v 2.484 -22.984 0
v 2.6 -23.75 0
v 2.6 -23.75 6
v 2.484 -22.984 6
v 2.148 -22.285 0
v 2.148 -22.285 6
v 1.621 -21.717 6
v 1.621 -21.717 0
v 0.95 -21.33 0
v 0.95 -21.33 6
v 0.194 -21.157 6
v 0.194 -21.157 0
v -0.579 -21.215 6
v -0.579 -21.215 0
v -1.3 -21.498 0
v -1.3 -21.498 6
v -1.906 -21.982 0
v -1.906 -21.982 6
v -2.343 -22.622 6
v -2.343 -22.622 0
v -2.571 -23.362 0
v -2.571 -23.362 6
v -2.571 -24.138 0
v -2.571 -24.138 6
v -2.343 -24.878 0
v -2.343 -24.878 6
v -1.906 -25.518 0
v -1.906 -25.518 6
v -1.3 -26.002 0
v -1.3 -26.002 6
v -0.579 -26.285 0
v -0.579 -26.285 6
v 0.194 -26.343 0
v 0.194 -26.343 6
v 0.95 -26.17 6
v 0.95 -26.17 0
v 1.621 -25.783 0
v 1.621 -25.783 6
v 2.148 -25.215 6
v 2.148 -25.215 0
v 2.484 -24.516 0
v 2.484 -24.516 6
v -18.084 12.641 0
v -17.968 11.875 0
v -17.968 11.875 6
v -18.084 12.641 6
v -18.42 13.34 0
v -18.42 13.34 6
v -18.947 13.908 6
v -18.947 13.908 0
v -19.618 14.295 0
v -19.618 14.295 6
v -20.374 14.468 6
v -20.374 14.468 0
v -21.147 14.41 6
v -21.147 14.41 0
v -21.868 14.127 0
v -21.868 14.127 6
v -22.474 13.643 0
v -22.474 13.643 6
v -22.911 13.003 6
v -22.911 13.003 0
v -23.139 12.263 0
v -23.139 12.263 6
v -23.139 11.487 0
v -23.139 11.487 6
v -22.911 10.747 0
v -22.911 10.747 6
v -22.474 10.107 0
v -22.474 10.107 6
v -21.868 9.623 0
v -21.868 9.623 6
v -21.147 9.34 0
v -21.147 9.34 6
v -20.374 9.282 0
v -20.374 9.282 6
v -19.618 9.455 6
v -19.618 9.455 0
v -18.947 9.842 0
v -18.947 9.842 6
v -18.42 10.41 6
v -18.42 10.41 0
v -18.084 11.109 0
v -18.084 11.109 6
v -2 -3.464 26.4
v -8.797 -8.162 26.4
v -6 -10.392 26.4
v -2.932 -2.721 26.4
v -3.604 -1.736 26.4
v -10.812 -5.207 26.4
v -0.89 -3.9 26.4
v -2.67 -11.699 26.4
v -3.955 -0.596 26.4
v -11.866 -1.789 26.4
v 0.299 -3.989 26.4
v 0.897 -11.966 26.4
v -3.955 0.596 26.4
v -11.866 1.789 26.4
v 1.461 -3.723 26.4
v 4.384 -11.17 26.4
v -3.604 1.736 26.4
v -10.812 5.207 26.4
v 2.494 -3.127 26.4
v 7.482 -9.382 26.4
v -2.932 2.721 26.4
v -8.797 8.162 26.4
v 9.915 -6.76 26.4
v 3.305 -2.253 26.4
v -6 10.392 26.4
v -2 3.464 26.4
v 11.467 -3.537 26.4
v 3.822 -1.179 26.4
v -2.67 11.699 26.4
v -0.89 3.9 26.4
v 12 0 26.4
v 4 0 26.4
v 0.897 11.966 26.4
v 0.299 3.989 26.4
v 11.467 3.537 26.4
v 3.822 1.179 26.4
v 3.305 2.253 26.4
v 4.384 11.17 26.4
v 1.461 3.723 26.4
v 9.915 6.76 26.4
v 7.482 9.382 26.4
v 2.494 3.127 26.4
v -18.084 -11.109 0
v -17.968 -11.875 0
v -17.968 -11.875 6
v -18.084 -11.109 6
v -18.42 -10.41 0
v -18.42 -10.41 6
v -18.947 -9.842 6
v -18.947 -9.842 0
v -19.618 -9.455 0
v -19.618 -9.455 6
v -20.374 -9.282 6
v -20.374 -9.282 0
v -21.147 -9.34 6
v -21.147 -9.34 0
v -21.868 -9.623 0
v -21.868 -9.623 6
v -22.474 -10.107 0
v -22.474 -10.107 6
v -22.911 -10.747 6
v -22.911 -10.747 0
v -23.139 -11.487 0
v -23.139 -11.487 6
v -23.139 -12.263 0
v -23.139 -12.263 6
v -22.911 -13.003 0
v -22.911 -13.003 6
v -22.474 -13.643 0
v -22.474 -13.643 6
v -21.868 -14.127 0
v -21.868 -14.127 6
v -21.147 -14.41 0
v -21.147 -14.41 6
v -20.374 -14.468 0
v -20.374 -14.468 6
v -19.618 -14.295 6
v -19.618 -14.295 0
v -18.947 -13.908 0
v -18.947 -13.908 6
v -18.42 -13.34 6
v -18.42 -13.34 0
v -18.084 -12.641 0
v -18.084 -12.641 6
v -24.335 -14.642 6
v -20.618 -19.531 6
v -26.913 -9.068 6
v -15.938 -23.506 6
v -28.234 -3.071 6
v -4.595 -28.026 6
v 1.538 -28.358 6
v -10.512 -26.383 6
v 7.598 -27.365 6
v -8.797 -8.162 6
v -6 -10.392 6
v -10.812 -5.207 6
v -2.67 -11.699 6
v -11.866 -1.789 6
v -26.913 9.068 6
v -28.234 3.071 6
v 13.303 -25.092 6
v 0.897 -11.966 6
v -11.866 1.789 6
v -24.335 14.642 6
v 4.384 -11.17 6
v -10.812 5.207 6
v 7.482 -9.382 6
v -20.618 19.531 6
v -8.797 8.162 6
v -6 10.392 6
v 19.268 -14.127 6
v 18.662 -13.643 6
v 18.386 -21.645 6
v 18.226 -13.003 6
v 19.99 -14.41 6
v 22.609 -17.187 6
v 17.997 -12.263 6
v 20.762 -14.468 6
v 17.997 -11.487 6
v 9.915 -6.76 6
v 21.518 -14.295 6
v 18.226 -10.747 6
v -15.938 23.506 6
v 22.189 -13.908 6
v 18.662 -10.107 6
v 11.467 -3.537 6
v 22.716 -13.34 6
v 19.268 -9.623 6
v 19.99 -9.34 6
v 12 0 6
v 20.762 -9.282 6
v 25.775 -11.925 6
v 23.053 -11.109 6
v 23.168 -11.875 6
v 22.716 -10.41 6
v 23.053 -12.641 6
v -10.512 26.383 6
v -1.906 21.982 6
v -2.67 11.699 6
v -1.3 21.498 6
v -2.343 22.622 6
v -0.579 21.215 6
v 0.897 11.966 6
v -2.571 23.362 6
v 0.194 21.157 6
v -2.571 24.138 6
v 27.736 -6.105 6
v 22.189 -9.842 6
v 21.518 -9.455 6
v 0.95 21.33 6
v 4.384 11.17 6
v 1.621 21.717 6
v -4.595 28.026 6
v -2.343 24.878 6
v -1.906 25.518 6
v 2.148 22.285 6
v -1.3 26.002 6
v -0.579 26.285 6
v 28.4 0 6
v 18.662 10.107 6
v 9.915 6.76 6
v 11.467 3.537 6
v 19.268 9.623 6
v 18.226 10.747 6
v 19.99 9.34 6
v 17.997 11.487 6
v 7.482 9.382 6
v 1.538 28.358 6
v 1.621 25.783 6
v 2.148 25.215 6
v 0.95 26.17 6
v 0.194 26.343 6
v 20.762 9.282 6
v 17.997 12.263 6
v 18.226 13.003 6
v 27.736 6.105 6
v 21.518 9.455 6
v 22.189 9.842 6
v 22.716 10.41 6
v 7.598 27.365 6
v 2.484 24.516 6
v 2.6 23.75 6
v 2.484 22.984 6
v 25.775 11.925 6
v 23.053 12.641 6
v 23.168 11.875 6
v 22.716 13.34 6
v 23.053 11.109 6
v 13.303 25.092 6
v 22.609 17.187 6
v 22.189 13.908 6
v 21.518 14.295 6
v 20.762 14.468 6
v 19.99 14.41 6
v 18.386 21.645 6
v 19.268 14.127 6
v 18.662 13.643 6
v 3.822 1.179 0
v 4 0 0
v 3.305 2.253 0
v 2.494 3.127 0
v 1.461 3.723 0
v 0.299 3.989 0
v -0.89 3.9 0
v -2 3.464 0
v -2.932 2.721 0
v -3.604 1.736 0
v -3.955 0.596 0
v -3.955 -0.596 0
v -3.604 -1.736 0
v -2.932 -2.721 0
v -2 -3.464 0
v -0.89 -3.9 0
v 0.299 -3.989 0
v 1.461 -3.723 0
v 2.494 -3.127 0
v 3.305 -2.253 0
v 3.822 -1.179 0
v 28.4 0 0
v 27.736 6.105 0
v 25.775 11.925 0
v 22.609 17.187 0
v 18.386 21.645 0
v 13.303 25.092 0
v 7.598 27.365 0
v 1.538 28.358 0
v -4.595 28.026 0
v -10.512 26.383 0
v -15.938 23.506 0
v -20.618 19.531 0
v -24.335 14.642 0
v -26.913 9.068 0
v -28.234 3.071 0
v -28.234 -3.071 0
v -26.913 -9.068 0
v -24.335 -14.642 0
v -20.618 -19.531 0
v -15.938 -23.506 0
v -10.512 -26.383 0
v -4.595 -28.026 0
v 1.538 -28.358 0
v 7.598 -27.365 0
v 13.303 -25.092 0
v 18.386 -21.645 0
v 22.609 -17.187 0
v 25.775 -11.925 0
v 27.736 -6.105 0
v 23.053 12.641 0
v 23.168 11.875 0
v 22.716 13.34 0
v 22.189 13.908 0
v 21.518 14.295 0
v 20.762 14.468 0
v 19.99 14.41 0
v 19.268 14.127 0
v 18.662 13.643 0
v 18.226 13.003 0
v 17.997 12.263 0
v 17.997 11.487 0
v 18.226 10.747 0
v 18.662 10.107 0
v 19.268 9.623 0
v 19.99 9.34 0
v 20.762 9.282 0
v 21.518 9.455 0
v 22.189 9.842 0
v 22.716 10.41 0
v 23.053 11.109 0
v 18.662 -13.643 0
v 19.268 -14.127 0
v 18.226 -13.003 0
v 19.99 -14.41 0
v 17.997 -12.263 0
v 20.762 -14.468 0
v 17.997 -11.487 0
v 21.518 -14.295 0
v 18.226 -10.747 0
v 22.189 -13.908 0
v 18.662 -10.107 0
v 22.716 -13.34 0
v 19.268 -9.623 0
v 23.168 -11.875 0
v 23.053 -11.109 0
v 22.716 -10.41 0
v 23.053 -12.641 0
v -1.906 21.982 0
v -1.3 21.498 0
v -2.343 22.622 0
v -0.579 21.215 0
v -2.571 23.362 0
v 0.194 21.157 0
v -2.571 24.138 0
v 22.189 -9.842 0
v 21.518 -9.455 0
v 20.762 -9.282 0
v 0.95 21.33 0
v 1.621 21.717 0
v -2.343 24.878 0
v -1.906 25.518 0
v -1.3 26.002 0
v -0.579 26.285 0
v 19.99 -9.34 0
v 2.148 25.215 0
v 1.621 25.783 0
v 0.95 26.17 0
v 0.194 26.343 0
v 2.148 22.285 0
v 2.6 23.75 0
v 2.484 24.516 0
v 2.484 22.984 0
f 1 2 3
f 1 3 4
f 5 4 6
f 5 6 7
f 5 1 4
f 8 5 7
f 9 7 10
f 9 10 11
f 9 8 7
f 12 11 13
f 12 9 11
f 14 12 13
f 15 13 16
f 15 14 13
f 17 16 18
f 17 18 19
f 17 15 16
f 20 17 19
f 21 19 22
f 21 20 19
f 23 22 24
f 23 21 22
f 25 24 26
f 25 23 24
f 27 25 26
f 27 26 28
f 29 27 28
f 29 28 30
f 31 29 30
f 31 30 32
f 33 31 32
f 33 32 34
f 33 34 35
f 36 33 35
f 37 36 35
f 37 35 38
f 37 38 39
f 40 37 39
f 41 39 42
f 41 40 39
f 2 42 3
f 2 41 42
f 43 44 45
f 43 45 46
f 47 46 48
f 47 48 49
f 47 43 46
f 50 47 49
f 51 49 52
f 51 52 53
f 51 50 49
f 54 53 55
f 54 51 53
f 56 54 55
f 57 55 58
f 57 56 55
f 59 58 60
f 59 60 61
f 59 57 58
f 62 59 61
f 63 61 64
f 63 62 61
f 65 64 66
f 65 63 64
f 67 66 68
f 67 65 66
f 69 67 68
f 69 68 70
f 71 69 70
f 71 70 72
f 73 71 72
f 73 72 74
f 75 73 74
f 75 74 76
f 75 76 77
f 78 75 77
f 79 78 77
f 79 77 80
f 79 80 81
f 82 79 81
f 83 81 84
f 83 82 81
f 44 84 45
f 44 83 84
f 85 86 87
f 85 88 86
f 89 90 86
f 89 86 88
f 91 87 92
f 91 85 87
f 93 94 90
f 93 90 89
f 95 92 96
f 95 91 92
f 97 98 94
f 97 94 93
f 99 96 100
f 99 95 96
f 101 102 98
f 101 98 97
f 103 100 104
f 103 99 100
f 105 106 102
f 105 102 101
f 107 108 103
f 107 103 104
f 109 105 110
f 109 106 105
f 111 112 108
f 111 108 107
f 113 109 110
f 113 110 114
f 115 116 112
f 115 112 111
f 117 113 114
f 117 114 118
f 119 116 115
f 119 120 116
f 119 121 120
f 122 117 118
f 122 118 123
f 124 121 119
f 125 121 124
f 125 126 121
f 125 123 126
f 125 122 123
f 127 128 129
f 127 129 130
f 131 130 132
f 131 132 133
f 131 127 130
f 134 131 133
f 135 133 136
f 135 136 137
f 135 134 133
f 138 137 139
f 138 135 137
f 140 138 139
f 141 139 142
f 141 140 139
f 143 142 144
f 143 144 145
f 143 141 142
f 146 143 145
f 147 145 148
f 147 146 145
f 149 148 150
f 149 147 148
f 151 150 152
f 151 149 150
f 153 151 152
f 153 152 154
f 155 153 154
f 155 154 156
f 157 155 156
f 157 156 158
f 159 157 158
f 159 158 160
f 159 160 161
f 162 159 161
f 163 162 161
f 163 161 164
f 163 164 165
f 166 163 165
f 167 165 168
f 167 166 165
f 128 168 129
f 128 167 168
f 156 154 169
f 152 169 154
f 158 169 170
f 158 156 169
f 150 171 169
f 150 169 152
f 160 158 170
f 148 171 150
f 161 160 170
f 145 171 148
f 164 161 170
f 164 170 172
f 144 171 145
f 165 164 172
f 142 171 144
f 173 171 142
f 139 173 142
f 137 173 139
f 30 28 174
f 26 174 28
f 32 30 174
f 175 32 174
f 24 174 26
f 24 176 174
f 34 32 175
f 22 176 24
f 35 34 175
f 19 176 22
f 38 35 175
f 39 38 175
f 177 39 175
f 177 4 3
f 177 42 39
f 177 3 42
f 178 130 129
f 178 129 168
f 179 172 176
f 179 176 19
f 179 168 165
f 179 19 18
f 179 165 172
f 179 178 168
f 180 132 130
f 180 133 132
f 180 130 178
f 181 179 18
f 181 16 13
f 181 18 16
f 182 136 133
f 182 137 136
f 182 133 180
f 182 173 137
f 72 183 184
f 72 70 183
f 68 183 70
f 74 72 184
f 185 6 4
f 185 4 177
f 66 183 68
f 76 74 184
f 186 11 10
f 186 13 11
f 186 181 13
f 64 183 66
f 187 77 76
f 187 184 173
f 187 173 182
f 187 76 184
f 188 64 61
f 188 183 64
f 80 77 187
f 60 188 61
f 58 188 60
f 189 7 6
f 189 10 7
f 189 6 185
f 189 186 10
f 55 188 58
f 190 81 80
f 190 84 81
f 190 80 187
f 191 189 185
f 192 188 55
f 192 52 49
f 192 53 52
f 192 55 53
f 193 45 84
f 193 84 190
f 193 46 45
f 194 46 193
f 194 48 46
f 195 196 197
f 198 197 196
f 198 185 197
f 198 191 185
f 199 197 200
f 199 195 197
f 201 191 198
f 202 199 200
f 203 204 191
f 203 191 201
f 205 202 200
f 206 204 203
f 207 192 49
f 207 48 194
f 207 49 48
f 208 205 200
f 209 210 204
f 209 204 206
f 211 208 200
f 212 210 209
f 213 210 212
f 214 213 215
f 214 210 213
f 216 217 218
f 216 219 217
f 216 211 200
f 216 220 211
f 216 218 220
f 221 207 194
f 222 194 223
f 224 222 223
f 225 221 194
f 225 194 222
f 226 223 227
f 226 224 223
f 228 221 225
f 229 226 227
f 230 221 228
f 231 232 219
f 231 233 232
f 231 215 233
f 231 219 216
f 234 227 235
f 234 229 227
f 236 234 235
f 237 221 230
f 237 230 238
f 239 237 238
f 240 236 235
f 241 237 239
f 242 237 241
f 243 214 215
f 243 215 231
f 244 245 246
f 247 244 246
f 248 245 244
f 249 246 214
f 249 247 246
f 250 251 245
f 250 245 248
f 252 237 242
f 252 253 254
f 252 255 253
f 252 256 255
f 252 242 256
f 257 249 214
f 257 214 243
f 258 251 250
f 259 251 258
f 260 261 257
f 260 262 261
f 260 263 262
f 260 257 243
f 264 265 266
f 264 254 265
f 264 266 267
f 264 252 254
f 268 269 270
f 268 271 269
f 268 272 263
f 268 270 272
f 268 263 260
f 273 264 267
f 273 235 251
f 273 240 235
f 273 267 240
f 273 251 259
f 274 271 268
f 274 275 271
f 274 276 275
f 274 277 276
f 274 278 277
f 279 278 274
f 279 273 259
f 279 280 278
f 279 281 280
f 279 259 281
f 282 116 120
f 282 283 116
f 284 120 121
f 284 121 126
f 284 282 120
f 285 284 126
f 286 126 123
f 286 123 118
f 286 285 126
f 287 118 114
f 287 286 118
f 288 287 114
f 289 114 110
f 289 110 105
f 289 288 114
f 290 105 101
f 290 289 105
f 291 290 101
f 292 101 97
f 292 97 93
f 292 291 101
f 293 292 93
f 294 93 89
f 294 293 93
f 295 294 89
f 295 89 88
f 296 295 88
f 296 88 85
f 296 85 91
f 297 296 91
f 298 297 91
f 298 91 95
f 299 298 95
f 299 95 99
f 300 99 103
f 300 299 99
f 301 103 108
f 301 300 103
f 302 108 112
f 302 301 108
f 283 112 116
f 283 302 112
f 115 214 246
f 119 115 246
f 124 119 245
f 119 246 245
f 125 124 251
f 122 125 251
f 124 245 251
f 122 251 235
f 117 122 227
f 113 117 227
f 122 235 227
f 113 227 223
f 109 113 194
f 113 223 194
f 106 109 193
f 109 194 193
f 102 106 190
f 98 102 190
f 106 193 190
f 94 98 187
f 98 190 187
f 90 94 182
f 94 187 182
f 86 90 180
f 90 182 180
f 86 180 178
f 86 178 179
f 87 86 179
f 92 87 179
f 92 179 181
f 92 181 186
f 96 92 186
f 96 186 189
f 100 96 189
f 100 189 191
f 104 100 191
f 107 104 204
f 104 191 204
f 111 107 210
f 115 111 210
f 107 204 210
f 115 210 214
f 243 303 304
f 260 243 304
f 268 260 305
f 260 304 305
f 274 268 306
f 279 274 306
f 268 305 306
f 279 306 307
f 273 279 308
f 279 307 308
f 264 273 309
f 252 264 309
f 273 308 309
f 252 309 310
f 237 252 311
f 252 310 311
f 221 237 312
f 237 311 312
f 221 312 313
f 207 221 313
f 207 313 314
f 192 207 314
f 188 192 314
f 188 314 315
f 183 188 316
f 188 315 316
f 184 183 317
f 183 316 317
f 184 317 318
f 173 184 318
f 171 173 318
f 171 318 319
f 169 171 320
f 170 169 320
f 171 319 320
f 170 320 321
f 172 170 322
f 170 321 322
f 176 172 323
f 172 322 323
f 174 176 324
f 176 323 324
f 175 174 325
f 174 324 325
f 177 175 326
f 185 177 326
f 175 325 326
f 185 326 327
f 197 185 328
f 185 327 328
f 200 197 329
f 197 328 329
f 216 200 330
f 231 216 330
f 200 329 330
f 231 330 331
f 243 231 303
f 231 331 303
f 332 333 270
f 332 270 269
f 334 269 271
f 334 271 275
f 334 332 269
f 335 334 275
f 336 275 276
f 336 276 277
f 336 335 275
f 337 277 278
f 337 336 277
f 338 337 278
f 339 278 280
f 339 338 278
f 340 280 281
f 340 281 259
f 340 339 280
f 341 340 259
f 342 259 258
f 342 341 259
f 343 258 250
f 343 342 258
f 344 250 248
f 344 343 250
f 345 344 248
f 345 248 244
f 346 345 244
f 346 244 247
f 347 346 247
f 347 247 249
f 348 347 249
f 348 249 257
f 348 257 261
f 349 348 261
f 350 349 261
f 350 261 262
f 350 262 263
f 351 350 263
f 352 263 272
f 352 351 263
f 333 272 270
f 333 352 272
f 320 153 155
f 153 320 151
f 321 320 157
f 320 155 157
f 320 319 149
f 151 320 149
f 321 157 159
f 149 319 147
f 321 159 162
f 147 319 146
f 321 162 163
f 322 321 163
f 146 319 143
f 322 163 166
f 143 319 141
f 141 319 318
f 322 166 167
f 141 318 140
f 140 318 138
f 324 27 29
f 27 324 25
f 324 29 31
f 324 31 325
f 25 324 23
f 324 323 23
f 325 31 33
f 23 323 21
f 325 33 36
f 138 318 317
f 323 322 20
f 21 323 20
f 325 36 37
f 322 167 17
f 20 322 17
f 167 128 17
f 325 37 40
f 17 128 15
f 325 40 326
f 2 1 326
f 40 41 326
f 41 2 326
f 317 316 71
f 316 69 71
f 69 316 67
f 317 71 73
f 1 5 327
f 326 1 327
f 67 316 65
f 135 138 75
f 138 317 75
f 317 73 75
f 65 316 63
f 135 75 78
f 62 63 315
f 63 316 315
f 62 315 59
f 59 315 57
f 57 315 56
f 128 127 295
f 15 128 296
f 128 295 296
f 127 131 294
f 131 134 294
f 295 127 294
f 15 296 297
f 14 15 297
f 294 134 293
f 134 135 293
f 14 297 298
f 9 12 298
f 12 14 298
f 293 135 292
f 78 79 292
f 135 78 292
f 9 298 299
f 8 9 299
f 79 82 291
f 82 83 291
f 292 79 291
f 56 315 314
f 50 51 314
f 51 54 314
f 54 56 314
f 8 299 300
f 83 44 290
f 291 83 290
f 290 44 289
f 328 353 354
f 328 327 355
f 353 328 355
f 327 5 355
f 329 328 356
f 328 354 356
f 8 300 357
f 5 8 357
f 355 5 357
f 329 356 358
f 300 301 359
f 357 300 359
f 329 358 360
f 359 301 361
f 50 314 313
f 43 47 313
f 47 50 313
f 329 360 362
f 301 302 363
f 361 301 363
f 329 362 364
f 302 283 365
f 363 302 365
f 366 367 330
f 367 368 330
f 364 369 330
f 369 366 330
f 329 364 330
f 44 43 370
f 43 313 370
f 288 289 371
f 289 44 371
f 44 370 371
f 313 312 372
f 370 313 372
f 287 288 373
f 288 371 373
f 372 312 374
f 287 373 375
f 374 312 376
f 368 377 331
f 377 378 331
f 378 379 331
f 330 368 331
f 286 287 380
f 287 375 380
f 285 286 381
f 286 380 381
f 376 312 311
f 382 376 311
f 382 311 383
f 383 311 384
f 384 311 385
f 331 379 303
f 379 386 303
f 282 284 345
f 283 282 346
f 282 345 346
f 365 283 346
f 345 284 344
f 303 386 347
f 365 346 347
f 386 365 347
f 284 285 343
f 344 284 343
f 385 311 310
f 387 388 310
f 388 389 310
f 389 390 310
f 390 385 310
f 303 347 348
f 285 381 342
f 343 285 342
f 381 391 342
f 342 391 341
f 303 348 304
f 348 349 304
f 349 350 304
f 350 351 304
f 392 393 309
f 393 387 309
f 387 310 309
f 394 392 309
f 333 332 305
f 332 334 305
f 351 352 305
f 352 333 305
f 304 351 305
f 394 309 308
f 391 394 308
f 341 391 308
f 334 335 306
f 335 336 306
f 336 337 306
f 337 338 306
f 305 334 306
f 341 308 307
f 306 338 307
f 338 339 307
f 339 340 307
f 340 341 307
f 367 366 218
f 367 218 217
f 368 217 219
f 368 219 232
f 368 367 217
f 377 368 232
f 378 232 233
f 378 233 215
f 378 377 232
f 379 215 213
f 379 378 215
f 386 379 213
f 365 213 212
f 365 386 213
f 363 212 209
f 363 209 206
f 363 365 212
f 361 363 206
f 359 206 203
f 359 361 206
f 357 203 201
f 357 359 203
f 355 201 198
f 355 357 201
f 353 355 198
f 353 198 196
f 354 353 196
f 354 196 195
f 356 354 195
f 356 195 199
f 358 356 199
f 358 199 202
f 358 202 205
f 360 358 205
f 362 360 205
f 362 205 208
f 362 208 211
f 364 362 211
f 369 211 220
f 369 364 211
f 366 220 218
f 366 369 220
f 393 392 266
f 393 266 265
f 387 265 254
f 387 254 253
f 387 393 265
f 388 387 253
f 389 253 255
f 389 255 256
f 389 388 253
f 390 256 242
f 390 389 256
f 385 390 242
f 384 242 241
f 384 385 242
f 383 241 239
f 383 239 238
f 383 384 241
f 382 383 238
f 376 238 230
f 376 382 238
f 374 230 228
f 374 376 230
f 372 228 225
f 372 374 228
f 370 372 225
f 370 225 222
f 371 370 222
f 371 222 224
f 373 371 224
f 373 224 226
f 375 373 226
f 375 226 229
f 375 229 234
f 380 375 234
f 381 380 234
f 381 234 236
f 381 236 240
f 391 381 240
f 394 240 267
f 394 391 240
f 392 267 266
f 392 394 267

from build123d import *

# Parameters (mm, degrees)
SKETCH1_R           = 28.4
SKETCH1_R_2         = 2.6
SKETCH1_R_3         = 4
BOSS_EXTRUDE1_DEPTH = 6
SKETCH2_R           = 12
SKETCH2_R_2         = 4
BOSS_EXTRUDE2_DEPTH = 20.4


with BuildPart() as part:
    # Sketch1 → Boss-Extrude1 (new body)
    with BuildSketch(Plane.XY):
        Circle(SKETCH1_R)
        with Locations((0, 23.75)):
            Circle(SKETCH1_R_2, mode=Mode.SUBTRACT)
        with Locations((20.56810334, 11.875)):
            Circle(SKETCH1_R_2, mode=Mode.SUBTRACT)
        with Locations((20.56810334, -11.875)):
            Circle(SKETCH1_R_2, mode=Mode.SUBTRACT)
        with Locations((0, -23.75)):
            Circle(SKETCH1_R_2, mode=Mode.SUBTRACT)
        with Locations((-20.56810334, -11.875)):
            Circle(SKETCH1_R_2, mode=Mode.SUBTRACT)
        with Locations((-20.56810334, 11.875)):
            Circle(SKETCH1_R_2, mode=Mode.SUBTRACT)
        Circle(SKETCH1_R_3, mode=Mode.SUBTRACT)
    extrude(amount=BOSS_EXTRUDE1_DEPTH)

    # Sketch2 → Boss-Extrude2 (add)
    with BuildSketch(Plane.XY.offset(6)):
        Circle(SKETCH2_R)
        Circle(SKETCH2_R_2, mode=Mode.SUBTRACT)
    extrude(amount=BOSS_EXTRUDE2_DEPTH)


solid = part.part
